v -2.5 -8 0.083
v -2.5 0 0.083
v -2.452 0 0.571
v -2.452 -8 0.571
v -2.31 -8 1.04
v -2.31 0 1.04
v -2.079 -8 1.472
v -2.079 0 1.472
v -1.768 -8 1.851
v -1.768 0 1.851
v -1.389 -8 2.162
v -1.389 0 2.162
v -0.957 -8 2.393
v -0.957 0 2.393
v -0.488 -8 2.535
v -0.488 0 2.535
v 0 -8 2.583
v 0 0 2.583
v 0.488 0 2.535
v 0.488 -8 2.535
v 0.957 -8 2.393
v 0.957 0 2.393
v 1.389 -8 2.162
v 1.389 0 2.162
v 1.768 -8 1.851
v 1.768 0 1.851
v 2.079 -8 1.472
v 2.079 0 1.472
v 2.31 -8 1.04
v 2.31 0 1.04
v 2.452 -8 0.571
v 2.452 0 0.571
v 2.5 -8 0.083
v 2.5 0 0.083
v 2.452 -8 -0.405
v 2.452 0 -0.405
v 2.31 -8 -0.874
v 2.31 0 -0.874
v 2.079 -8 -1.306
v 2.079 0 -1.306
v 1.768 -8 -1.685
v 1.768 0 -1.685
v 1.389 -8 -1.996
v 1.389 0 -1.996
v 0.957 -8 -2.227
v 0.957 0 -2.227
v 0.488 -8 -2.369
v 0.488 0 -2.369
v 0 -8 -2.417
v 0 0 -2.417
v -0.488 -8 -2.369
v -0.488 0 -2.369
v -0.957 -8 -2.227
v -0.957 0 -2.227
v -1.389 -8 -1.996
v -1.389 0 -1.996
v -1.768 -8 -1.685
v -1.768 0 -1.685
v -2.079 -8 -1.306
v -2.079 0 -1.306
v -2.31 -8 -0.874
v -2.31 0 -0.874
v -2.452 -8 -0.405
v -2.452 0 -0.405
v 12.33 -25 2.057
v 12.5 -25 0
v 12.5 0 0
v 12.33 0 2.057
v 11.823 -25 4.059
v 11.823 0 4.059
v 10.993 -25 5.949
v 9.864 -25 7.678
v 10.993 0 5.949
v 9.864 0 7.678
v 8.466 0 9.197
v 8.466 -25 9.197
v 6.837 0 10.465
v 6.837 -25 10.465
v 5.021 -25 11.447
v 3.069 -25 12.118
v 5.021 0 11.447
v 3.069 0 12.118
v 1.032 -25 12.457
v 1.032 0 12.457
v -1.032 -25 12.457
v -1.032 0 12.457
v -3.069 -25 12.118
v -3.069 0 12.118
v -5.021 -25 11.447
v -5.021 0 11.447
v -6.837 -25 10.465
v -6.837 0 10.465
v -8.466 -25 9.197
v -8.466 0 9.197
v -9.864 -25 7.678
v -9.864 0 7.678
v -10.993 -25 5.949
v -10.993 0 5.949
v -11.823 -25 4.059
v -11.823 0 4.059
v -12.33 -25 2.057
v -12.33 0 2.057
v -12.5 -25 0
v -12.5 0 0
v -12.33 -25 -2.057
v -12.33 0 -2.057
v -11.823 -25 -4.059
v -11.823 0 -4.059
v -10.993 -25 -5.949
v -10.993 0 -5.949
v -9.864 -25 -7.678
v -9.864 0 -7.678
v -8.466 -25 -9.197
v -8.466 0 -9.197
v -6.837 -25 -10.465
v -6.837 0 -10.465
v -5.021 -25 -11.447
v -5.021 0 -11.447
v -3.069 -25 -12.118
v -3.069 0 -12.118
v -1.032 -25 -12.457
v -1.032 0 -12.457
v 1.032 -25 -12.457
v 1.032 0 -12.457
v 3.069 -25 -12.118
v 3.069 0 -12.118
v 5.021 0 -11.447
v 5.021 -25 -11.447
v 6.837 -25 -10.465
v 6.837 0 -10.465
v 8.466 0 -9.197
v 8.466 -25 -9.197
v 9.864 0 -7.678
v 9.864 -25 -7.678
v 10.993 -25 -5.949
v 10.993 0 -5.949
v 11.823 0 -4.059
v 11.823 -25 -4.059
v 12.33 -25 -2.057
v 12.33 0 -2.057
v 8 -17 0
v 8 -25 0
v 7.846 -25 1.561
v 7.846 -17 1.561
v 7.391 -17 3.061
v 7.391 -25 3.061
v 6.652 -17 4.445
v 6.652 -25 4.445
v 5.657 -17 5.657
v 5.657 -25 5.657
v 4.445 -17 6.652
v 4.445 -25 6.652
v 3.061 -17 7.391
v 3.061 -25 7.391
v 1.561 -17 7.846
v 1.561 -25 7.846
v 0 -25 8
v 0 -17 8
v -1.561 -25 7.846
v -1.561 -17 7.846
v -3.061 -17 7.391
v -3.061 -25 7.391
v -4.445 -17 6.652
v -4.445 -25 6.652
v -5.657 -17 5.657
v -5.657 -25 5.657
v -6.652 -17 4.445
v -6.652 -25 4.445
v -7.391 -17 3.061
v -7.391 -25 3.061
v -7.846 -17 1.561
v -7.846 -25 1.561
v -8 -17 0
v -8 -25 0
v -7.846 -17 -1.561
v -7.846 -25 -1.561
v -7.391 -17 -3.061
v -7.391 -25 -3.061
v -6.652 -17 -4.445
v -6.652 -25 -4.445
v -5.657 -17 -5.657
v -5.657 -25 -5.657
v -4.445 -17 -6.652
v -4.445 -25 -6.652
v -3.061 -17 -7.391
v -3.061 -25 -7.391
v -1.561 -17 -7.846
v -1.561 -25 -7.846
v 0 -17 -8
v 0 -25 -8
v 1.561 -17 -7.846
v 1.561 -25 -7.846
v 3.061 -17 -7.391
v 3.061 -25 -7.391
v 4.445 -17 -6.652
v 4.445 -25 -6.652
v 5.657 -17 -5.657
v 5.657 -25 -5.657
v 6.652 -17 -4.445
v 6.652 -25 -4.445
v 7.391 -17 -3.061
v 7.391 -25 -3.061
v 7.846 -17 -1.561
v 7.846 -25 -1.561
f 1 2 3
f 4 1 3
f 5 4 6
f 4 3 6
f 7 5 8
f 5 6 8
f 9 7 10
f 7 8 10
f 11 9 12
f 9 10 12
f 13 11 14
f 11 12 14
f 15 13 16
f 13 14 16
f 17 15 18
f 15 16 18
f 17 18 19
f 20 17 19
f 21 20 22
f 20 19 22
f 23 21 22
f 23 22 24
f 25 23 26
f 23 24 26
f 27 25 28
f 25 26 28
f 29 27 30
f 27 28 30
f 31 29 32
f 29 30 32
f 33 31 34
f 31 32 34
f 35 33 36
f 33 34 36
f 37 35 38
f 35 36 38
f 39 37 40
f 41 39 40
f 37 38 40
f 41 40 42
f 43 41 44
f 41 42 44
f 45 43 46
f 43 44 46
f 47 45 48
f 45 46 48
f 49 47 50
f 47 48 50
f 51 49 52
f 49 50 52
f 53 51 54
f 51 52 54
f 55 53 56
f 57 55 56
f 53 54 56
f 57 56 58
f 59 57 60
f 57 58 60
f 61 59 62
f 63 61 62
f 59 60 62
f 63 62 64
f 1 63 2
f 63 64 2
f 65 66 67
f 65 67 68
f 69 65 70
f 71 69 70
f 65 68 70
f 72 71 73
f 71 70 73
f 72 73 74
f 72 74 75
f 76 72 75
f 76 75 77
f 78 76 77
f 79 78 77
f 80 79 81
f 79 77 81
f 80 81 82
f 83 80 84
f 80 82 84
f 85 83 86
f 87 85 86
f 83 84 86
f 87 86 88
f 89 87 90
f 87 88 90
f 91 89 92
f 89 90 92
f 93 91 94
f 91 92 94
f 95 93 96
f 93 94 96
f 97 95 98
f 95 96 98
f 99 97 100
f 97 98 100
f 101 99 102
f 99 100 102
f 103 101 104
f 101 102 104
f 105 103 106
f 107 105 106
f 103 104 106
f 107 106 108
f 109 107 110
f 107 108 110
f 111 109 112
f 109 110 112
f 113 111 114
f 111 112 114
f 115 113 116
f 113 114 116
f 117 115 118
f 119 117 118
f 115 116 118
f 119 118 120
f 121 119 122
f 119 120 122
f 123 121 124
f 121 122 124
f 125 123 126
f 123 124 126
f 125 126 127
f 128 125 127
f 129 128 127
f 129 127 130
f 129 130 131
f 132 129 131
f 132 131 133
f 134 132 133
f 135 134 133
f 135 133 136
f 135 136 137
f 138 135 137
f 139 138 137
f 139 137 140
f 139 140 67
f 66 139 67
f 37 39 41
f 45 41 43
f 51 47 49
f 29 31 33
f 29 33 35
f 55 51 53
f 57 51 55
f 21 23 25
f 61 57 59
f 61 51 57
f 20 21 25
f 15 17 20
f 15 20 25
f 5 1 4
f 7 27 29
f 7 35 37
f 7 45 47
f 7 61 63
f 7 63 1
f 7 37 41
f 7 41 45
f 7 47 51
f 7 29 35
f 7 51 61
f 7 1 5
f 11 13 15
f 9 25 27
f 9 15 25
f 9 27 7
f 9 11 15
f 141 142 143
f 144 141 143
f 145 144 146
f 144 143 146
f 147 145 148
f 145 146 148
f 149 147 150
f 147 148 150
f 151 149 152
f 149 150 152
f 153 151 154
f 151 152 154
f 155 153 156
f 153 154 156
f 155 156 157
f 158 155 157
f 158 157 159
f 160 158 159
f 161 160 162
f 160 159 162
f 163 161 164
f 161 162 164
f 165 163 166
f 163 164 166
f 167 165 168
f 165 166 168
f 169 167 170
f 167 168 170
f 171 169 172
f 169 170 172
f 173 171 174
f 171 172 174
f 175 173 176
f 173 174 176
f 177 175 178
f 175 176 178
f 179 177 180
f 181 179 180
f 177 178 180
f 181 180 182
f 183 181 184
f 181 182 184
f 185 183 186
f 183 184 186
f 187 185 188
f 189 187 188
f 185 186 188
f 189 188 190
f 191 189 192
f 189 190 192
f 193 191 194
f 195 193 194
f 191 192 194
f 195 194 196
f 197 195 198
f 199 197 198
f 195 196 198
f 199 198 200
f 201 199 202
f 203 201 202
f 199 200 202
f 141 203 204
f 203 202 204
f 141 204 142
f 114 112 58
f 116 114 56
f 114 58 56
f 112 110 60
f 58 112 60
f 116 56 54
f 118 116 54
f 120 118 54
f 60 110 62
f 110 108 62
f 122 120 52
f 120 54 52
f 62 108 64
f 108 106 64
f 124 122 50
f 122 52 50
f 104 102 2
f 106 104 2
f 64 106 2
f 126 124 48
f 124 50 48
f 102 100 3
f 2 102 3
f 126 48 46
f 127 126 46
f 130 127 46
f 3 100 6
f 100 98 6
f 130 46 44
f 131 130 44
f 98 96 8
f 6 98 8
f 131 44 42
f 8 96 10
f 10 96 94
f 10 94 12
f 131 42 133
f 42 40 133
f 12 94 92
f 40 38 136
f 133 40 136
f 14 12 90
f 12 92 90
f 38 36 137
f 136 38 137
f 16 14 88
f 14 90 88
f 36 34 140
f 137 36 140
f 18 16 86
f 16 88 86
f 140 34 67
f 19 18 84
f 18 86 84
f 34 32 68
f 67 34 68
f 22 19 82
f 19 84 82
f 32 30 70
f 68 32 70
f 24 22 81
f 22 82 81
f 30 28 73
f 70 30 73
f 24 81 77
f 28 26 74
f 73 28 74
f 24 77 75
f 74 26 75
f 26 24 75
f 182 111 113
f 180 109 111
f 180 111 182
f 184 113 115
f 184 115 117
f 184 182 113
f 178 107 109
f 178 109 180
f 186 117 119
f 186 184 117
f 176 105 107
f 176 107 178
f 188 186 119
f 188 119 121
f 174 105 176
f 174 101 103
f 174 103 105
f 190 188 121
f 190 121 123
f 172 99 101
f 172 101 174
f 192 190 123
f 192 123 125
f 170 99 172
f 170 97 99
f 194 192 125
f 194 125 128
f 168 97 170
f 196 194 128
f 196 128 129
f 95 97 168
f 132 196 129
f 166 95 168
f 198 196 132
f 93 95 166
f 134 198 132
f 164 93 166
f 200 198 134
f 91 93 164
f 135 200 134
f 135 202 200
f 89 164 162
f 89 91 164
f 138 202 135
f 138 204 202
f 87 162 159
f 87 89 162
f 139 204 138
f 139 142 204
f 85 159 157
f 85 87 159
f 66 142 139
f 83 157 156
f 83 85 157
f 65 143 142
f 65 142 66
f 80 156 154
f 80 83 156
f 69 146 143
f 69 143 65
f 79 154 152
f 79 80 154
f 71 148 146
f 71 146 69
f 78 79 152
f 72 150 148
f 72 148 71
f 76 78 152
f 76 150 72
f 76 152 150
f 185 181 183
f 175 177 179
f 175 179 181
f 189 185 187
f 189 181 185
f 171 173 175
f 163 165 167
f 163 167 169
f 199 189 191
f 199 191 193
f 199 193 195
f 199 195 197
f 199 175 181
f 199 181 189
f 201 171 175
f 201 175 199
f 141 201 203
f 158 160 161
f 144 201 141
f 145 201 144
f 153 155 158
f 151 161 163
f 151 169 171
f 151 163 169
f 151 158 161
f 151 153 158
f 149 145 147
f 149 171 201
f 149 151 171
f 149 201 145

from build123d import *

# Parameters (mm, degrees)
F0_R     = 12.5
F1_DEPTH = 25
F2_R     = 2.5
F3_DEPTH = 8
F4_R     = 8
F5_DEPTH = 8


with BuildPart() as f1:
    # F0 (on Front) → F1 (new body)
    with BuildSketch(Plane.XZ):
        Circle(F0_R)
    extrude(amount=F1_DEPTH)

    # F2 (on face) → F3 (cut)
    with BuildSketch(Plane(origin=(0, 0, 0), x_dir=(-1, 0, 0), z_dir=(0, 1, 0))):
        with Locations((0, 0.083146)):
            Circle(F2_R)
    extrude(amount=-F3_DEPTH, mode=Mode.SUBTRACT)

    # F4 (on face) → F5 (cut)
    with BuildSketch(Plane.XZ.offset(25)):
        Circle(F4_R)
    extrude(amount=-F5_DEPTH, mode=Mode.SUBTRACT)


solid = f1.part
